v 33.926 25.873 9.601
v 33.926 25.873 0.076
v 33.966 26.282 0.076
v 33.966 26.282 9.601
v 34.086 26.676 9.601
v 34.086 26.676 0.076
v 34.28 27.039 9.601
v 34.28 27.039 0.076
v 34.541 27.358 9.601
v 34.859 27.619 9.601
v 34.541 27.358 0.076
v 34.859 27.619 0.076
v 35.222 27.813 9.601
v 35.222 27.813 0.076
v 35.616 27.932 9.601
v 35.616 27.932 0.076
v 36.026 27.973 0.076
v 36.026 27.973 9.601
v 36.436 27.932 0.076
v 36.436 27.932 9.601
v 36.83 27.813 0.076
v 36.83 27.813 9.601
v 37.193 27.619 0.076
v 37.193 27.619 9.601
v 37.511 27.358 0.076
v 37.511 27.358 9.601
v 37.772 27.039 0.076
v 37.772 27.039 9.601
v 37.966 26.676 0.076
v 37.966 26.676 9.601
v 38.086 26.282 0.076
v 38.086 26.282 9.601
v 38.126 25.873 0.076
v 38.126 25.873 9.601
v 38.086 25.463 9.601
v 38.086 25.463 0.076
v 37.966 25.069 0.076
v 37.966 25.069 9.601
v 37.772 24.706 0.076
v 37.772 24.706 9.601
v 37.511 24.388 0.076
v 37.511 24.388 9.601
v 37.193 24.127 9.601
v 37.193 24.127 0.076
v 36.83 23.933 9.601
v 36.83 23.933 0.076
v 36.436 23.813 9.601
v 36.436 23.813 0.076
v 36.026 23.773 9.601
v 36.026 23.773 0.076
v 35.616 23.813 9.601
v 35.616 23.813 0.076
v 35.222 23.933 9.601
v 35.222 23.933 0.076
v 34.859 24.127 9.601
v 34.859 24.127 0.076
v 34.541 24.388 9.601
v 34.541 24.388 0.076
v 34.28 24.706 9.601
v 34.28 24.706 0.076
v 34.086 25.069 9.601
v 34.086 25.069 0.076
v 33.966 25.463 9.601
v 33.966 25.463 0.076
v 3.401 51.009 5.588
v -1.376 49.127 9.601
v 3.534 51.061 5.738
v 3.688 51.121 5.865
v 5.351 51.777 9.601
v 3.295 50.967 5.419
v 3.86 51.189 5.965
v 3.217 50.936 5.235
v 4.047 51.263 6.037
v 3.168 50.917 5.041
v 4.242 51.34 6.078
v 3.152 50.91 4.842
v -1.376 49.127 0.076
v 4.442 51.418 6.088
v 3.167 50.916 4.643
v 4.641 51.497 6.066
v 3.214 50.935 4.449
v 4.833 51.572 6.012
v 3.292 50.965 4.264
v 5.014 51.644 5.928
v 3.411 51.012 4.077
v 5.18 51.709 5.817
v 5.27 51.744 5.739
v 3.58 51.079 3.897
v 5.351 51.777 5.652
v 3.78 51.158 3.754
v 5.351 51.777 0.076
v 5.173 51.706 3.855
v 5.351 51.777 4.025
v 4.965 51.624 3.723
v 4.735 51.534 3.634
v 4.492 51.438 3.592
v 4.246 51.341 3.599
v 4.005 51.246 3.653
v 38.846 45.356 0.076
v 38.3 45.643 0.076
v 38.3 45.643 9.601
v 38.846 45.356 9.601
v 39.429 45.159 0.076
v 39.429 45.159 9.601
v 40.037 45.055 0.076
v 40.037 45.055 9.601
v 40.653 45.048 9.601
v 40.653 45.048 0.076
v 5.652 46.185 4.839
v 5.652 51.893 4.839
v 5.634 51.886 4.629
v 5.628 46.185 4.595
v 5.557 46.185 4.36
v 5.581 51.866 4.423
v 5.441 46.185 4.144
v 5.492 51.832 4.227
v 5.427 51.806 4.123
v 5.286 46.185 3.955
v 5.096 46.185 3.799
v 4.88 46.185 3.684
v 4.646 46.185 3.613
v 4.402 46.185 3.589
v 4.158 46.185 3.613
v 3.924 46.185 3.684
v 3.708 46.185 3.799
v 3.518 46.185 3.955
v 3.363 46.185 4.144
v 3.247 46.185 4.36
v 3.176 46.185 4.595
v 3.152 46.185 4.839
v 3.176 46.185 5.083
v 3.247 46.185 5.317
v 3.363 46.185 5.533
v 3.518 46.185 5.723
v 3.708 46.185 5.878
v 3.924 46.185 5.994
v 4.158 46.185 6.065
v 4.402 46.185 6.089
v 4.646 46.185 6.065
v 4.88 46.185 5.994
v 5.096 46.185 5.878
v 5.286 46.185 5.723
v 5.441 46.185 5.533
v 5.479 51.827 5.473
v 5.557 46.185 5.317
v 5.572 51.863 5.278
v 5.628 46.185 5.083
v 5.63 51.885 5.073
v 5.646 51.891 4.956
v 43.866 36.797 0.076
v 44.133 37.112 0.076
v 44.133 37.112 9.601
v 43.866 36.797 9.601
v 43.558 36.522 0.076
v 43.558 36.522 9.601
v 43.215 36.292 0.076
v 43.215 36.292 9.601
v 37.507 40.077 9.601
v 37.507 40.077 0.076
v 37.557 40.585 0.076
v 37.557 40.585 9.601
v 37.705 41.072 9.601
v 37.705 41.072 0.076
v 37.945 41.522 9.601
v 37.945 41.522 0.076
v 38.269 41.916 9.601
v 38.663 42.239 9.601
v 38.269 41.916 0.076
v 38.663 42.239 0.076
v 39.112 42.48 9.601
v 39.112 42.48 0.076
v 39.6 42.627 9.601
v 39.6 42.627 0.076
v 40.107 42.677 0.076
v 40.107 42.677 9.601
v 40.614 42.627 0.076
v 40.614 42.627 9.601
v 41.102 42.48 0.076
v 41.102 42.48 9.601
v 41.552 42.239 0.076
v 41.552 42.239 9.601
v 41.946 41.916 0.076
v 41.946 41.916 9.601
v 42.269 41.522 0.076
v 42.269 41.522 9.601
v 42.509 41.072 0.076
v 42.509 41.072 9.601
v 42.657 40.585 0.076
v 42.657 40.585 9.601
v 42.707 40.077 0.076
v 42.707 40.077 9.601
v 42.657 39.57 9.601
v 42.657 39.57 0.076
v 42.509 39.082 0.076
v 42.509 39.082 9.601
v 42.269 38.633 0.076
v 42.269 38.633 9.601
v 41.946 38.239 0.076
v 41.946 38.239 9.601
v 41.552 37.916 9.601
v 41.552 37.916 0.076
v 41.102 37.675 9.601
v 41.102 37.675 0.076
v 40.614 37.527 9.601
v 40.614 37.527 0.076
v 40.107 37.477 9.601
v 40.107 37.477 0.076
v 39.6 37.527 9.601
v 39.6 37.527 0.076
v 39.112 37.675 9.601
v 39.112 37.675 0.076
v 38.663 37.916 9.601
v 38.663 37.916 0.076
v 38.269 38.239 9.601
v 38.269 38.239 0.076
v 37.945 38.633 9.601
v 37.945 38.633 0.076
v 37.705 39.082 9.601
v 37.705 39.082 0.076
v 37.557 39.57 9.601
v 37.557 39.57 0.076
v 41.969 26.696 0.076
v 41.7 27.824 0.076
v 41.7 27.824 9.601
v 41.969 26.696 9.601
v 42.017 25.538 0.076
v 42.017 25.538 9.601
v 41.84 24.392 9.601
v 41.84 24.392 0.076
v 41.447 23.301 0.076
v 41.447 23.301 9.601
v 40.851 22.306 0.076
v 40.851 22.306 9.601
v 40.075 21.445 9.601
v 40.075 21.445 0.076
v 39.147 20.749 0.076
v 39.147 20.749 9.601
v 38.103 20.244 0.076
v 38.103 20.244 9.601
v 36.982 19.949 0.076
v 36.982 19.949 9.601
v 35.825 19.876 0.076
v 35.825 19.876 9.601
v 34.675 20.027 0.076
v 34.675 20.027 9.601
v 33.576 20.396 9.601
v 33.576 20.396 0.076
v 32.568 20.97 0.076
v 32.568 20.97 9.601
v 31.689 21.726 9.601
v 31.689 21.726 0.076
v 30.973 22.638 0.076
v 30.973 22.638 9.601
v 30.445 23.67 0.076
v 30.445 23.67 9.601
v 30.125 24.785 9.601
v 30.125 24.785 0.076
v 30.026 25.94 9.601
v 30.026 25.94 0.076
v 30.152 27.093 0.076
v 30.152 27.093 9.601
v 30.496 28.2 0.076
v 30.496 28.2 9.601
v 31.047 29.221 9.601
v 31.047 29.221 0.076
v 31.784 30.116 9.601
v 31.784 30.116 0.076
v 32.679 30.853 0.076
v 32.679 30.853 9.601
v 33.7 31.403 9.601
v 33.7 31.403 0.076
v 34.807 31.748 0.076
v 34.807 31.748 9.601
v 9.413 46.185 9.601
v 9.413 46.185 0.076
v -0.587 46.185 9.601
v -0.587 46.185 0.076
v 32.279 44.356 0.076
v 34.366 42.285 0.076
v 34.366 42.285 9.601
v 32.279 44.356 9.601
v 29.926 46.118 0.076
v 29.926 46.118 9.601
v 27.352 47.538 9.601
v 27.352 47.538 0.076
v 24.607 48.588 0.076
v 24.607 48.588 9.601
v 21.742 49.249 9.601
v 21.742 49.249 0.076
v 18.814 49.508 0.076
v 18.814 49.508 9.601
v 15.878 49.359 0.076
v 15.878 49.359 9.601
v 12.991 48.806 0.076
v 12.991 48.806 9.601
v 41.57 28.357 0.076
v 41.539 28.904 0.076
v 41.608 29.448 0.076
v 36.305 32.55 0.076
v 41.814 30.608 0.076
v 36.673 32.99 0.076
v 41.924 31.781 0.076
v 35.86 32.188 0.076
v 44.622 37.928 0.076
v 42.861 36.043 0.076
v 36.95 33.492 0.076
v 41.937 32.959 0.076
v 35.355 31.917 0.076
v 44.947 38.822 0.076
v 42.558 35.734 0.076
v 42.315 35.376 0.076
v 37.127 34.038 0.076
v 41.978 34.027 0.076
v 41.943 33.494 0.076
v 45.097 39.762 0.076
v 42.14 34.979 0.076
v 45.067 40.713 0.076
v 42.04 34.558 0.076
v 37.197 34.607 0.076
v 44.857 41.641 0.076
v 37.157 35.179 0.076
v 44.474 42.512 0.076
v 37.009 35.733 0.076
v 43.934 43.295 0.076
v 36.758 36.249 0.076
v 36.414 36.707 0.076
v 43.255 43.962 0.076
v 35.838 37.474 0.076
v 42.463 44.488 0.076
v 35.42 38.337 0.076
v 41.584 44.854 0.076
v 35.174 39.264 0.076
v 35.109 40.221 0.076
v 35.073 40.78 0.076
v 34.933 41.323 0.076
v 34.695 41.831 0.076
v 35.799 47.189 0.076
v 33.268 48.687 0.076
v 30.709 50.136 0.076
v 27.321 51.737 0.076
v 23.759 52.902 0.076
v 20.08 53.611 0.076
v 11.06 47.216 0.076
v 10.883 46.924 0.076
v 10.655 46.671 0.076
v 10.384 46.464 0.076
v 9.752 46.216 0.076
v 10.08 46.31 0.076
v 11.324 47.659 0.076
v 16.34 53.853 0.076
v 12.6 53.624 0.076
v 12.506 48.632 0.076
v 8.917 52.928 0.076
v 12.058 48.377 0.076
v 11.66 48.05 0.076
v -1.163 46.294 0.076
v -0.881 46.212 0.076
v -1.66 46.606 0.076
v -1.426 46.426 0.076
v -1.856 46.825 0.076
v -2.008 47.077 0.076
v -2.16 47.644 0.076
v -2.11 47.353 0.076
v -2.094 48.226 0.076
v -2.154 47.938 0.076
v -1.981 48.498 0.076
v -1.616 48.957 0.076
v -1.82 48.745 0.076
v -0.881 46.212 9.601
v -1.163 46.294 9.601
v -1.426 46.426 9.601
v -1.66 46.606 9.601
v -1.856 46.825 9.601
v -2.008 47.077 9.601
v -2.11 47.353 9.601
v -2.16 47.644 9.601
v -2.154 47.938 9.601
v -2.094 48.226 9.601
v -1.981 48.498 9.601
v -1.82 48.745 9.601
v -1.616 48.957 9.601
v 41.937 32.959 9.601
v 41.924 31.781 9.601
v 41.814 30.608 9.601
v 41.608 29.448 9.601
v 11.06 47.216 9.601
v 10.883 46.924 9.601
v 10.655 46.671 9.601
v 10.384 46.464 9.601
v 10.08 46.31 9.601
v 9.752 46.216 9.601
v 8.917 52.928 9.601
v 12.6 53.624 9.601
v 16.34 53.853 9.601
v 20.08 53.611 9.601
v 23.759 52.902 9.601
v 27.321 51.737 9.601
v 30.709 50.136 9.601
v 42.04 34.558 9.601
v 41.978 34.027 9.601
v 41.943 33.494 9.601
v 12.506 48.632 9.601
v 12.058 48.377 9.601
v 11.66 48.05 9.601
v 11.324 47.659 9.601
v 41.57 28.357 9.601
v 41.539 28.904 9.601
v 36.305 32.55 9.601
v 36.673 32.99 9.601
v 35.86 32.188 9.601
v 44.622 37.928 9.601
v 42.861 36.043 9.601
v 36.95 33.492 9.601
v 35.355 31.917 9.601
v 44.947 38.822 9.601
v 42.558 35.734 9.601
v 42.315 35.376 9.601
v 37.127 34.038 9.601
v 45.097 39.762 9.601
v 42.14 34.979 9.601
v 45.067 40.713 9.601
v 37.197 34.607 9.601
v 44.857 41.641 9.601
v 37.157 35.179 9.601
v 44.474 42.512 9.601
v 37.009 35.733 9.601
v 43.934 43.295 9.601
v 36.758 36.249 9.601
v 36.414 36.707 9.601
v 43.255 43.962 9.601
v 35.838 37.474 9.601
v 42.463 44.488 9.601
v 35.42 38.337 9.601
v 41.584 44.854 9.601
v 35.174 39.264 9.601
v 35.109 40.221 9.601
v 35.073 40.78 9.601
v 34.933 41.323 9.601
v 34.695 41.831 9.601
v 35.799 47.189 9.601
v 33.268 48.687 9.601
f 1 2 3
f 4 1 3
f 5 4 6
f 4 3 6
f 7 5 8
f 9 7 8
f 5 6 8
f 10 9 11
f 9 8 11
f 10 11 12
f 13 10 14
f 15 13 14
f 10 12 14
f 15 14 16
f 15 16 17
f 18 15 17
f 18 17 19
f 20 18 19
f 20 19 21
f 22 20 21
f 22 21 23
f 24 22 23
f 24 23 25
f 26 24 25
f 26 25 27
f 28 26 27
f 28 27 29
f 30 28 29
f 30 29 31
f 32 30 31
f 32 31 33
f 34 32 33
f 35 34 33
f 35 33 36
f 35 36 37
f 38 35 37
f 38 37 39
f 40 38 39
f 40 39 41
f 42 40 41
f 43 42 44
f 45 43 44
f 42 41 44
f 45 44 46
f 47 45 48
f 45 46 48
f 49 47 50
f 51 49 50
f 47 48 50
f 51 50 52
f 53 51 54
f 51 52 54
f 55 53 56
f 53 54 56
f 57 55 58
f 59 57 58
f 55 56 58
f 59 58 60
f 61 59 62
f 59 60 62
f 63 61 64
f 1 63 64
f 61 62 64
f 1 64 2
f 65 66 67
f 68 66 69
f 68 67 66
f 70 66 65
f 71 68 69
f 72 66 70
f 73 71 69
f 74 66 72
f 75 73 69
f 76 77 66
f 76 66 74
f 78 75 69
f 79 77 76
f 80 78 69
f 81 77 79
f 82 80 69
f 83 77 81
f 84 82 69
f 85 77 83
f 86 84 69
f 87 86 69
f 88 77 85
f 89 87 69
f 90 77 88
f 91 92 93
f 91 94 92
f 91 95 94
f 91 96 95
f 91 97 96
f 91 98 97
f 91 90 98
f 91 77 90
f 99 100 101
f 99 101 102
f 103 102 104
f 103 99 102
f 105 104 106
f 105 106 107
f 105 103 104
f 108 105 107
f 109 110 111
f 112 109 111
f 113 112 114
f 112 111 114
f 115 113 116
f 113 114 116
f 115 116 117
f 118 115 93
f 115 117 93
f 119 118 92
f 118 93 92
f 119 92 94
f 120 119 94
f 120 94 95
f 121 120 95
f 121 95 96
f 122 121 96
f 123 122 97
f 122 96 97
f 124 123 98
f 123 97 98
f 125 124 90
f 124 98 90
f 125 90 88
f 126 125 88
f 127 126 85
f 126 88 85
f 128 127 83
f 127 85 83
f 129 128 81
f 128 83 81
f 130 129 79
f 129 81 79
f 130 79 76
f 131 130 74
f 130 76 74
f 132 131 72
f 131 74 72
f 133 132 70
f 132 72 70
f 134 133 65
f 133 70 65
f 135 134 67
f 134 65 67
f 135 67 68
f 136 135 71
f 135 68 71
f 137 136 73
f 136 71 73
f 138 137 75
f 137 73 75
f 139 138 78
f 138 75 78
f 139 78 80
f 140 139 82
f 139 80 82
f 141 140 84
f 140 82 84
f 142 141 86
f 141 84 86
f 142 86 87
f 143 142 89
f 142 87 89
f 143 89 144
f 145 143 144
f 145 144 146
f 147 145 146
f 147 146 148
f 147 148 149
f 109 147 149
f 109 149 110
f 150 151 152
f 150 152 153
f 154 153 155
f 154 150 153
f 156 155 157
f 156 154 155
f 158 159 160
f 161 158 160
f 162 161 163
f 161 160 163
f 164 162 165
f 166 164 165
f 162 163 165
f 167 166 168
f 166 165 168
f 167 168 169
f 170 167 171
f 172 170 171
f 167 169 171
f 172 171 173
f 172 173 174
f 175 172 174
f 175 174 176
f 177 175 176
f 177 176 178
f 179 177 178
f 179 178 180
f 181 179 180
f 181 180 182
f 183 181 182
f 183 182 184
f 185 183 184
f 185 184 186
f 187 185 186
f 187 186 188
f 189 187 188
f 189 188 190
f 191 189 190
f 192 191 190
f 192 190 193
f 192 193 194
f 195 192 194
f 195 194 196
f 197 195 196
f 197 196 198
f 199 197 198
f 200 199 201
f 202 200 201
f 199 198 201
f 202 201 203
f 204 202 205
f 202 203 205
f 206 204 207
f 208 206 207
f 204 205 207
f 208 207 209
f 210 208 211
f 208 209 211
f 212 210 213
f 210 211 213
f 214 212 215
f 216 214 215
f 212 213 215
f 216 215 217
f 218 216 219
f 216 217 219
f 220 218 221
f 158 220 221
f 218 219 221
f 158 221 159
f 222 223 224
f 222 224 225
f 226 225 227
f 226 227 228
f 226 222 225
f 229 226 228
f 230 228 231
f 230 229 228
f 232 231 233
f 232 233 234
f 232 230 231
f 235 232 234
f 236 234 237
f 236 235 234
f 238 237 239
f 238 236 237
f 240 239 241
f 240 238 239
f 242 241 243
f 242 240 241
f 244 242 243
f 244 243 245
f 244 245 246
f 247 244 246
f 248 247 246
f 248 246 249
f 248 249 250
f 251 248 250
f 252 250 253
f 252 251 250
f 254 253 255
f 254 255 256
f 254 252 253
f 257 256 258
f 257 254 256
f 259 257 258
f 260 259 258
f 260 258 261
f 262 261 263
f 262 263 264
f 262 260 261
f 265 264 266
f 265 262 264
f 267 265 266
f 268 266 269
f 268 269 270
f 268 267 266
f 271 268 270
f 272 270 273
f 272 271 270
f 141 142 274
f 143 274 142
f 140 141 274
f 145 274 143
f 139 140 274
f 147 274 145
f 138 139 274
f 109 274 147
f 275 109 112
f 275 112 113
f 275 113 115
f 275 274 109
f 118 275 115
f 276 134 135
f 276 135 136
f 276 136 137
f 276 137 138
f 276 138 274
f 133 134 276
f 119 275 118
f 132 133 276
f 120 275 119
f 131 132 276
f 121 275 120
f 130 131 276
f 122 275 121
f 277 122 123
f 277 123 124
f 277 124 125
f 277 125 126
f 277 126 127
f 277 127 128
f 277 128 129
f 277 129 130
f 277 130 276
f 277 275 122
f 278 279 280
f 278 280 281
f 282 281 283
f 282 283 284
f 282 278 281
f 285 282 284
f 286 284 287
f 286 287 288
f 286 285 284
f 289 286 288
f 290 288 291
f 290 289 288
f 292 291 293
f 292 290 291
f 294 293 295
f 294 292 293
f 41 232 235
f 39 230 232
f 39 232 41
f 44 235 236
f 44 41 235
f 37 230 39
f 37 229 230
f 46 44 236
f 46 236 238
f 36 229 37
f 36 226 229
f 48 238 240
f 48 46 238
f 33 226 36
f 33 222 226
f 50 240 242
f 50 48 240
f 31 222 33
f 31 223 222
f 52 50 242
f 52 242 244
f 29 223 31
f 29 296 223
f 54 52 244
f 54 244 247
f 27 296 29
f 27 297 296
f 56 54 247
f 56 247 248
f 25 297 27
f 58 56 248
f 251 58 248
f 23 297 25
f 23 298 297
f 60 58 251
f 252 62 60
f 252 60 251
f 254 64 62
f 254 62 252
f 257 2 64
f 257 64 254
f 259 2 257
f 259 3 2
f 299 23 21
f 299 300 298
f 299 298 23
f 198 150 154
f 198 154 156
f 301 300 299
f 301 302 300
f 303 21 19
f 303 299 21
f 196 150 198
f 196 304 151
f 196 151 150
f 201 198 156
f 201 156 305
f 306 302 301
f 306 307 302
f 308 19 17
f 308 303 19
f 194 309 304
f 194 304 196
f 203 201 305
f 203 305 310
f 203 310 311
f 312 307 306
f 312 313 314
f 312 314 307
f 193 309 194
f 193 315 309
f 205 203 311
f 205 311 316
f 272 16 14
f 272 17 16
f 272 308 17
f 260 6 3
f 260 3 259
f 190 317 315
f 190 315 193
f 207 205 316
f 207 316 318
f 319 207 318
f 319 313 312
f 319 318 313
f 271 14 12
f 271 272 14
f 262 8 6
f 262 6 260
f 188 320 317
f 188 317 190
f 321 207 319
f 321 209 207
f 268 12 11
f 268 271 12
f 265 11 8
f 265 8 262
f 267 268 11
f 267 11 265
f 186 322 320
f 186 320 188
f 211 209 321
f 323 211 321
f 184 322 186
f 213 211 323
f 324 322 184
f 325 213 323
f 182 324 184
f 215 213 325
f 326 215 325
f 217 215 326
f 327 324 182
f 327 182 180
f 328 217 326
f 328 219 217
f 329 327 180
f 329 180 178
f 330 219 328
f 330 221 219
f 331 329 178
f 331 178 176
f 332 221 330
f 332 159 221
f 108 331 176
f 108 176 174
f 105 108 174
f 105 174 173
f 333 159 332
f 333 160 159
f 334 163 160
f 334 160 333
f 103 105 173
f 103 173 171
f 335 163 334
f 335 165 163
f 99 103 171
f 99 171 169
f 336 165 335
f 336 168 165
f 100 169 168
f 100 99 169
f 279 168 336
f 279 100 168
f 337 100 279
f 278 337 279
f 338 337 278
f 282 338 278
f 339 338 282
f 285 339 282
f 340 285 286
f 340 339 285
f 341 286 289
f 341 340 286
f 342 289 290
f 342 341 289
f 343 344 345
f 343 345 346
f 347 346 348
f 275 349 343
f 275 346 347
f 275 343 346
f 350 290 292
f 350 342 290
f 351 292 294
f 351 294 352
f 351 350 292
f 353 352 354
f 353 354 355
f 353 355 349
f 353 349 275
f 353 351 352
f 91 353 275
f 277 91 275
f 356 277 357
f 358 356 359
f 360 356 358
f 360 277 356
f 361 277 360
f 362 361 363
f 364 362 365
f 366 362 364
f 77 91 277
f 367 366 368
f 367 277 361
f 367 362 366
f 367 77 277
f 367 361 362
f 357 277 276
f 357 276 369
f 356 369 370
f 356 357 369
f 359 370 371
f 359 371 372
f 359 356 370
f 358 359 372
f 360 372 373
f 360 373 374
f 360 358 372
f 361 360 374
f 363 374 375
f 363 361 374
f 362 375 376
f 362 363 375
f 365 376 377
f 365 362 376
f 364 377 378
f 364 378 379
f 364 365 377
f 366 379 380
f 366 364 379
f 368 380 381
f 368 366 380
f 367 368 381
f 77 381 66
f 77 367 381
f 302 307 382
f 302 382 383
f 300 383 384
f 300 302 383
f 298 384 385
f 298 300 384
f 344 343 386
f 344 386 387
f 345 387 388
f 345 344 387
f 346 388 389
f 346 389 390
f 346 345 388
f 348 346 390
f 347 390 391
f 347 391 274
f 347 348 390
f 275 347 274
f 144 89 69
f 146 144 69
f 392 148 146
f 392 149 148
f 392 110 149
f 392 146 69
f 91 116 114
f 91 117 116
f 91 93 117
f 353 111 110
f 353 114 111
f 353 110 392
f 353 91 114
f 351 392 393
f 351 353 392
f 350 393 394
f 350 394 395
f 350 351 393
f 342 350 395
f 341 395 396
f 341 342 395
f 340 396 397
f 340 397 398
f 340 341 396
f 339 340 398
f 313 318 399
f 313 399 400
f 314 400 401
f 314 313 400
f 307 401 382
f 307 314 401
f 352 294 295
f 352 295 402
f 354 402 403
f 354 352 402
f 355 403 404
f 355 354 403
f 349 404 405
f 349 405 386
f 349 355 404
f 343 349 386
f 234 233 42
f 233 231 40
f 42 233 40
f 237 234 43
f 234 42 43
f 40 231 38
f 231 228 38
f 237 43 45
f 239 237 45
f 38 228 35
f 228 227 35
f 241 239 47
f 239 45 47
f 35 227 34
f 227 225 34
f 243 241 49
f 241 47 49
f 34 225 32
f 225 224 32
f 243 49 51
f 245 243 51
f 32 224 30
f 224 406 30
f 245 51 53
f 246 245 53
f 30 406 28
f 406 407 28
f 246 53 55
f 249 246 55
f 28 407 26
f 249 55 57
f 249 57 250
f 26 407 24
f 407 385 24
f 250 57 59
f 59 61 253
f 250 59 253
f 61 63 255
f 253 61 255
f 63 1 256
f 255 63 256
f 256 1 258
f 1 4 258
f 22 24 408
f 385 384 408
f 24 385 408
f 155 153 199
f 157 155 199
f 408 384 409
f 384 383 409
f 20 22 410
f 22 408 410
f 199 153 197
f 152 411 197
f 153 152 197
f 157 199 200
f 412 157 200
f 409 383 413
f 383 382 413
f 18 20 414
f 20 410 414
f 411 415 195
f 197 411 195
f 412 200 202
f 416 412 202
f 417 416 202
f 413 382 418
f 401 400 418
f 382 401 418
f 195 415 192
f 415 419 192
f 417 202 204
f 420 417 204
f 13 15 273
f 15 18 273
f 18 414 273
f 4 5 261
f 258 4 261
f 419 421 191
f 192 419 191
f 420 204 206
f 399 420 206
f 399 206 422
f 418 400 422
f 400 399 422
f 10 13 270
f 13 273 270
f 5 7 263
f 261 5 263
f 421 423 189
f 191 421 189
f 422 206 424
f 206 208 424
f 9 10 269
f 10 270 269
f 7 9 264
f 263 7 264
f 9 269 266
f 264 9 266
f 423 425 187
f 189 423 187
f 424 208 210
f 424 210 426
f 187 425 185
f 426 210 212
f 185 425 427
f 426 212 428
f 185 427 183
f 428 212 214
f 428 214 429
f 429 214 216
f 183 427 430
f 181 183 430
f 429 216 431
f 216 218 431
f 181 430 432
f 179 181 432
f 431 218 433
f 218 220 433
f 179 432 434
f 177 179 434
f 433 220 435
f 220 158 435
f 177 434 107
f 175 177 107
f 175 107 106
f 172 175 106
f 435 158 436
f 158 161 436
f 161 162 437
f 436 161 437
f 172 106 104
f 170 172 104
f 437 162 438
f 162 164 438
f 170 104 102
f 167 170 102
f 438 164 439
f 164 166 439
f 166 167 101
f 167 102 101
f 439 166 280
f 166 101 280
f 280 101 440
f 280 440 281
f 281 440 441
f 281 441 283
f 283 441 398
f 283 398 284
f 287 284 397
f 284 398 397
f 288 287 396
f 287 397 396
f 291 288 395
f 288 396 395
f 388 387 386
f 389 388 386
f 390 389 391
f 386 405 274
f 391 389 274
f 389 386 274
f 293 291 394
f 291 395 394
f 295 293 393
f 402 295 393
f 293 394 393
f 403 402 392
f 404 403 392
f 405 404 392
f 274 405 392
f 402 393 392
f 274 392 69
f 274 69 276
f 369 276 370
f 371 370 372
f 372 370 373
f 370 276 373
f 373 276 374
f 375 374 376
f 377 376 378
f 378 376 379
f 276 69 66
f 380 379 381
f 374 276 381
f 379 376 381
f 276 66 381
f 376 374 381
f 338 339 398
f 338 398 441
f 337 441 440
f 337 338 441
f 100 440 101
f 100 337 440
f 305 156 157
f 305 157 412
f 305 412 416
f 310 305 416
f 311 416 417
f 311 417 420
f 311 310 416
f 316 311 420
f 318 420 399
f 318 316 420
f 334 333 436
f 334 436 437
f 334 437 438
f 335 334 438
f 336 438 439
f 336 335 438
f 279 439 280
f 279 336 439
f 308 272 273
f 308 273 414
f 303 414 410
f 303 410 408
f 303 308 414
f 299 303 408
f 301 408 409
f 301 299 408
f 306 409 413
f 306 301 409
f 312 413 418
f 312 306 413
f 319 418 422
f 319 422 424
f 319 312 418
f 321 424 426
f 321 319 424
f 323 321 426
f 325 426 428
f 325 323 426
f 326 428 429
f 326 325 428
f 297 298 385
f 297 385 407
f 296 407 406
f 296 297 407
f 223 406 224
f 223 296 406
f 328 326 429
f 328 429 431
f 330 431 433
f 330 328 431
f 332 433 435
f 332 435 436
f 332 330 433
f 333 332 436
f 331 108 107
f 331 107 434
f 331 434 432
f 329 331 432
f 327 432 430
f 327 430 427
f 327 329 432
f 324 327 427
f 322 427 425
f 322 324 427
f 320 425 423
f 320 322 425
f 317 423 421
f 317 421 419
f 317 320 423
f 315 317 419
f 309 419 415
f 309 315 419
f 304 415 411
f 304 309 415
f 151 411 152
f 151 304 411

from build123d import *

# Parameters (mm, degrees)
BOSS_EXTRUDE1_DEPTH            = 9.525
F_5_2_5_2_DIAMETER_HOLE1_D     = 5.2
F_4_2_4_2_DIAMETER_HOLE1_D     = 4.2
F_2_5_2_5_DIAMETER_HOLE1_D     = 2.5
F_2_5_2_5_DIAMETER_HOLE1_DEPTH = 7.667982396


with BuildPart() as part:
    # Sketch1 → Boss-Extrude1 (new body)
    with BuildSketch(Plane(origin=(0, 0, 0.0762), x_dir=(-1, 0, 0), z_dir=(0, 0, -1))):
        with BuildLine():
            Line((-9.412617214, 46.18458545), (0.587382786, 46.18458545))
            ThreePointArc((0.587382786, 46.18458545), (2.110476578, 47.353297027), (1.375792677, 49.126977103))
            Line((1.375792677, 49.126977103), (-5.351179793, 51.776567317))
            ThreePointArc((-5.351179793, 51.776567317), (-18.213654114, 53.790284286), (-30.709315287, 50.135595029))
            ThreePointArc((-30.709315287, 50.135595029), (-34.537024445, 47.94381083), (-38.300389687, 45.643298402))
            ThreePointArc((-38.300389687, 45.643298402), (-39.429298758, 45.158647975), (-40.652811507, 45.047570171))
            ThreePointArc((-40.652811507, 45.047570171), (-44.686309378, 42.085440442), (-44.132804376, 37.111815022))
            ThreePointArc((-44.132804376, 37.111815022), (-43.716518775, 36.654265458), (-43.215241162, 36.291820896))
            ThreePointArc((-43.215241162, 36.291820896), (-42.428281445, 35.560296453), (-42.040186752, 34.558390211))
            ThreePointArc((-42.040186752, 34.558390211), (-41.957032136, 33.760744193), (-41.937117029, 32.959022765))
            ThreePointArc((-41.937117029, 32.959022765), (-41.88143503, 31.193095612), (-41.60760357, 29.447639934))
            ThreePointArc((-41.60760357, 29.447639934), (-41.541656296, 28.62951348), (-41.699906943, 27.824133651))
            ThreePointArc((-41.699906943, 27.824133651), (-33.057909903, 20.65839923), (-34.807142386, 31.747675507))
            ThreePointArc((-34.807142386, 31.747675507), (-37.051659352, 33.760582292), (-36.413760604, 36.707230442))
            ThreePointArc((-36.413760604, 36.707230442), (-35.419836056, 38.33724075), (-35.109301279, 40.220957226))
            ThreePointArc((-35.109301279, 40.220957226), (-34.933115189, 41.323470745), (-34.365977773, 42.285204986))
            ThreePointArc((-34.365977773, 42.285204986), (-24.606791119, 48.588208914), (-12.991191822, 48.806006202))
            ThreePointArc((-12.991191822, 48.806006202), (-11.85169268, 48.221904682), (-11.059558102, 47.215845196))
            ThreePointArc((-11.059558102, 47.215845196), (-10.384202381, 46.46367337), (-9.412617214, 46.18458545))
        make_face()
    extrude(amount=-BOSS_EXTRUDE1_DEPTH)

    # Ø5.2 (5.2) Diameter Hole1 (through all)
    with Locations(Plane.XY.offset(9.6012)):
        with Locations((40.107240677, 40.077424049)):
            Hole(F_5_2_5_2_DIAMETER_HOLE1_D / 2)

    # Ø4.2 (4.2) Diameter Hole1 (through all)
    with Locations(Plane.XY.offset(9.6012)):
        with Locations((36.026082039, 25.872797966)):
            Hole(F_4_2_4_2_DIAMETER_HOLE1_D / 2)

    # Ø2.5 (2.5) Diameter Hole1
    with Locations(Plane(origin=(0, 46.18458545, 0), x_dir=(-1, 0, 0), z_dir=(0, -1, 0))):
        with Locations((-4.401993155, -4.8387)):
            Hole(F_2_5_2_5_DIAMETER_HOLE1_D / 2, depth=F_2_5_2_5_DIAMETER_HOLE1_DEPTH)


solid = part.part
